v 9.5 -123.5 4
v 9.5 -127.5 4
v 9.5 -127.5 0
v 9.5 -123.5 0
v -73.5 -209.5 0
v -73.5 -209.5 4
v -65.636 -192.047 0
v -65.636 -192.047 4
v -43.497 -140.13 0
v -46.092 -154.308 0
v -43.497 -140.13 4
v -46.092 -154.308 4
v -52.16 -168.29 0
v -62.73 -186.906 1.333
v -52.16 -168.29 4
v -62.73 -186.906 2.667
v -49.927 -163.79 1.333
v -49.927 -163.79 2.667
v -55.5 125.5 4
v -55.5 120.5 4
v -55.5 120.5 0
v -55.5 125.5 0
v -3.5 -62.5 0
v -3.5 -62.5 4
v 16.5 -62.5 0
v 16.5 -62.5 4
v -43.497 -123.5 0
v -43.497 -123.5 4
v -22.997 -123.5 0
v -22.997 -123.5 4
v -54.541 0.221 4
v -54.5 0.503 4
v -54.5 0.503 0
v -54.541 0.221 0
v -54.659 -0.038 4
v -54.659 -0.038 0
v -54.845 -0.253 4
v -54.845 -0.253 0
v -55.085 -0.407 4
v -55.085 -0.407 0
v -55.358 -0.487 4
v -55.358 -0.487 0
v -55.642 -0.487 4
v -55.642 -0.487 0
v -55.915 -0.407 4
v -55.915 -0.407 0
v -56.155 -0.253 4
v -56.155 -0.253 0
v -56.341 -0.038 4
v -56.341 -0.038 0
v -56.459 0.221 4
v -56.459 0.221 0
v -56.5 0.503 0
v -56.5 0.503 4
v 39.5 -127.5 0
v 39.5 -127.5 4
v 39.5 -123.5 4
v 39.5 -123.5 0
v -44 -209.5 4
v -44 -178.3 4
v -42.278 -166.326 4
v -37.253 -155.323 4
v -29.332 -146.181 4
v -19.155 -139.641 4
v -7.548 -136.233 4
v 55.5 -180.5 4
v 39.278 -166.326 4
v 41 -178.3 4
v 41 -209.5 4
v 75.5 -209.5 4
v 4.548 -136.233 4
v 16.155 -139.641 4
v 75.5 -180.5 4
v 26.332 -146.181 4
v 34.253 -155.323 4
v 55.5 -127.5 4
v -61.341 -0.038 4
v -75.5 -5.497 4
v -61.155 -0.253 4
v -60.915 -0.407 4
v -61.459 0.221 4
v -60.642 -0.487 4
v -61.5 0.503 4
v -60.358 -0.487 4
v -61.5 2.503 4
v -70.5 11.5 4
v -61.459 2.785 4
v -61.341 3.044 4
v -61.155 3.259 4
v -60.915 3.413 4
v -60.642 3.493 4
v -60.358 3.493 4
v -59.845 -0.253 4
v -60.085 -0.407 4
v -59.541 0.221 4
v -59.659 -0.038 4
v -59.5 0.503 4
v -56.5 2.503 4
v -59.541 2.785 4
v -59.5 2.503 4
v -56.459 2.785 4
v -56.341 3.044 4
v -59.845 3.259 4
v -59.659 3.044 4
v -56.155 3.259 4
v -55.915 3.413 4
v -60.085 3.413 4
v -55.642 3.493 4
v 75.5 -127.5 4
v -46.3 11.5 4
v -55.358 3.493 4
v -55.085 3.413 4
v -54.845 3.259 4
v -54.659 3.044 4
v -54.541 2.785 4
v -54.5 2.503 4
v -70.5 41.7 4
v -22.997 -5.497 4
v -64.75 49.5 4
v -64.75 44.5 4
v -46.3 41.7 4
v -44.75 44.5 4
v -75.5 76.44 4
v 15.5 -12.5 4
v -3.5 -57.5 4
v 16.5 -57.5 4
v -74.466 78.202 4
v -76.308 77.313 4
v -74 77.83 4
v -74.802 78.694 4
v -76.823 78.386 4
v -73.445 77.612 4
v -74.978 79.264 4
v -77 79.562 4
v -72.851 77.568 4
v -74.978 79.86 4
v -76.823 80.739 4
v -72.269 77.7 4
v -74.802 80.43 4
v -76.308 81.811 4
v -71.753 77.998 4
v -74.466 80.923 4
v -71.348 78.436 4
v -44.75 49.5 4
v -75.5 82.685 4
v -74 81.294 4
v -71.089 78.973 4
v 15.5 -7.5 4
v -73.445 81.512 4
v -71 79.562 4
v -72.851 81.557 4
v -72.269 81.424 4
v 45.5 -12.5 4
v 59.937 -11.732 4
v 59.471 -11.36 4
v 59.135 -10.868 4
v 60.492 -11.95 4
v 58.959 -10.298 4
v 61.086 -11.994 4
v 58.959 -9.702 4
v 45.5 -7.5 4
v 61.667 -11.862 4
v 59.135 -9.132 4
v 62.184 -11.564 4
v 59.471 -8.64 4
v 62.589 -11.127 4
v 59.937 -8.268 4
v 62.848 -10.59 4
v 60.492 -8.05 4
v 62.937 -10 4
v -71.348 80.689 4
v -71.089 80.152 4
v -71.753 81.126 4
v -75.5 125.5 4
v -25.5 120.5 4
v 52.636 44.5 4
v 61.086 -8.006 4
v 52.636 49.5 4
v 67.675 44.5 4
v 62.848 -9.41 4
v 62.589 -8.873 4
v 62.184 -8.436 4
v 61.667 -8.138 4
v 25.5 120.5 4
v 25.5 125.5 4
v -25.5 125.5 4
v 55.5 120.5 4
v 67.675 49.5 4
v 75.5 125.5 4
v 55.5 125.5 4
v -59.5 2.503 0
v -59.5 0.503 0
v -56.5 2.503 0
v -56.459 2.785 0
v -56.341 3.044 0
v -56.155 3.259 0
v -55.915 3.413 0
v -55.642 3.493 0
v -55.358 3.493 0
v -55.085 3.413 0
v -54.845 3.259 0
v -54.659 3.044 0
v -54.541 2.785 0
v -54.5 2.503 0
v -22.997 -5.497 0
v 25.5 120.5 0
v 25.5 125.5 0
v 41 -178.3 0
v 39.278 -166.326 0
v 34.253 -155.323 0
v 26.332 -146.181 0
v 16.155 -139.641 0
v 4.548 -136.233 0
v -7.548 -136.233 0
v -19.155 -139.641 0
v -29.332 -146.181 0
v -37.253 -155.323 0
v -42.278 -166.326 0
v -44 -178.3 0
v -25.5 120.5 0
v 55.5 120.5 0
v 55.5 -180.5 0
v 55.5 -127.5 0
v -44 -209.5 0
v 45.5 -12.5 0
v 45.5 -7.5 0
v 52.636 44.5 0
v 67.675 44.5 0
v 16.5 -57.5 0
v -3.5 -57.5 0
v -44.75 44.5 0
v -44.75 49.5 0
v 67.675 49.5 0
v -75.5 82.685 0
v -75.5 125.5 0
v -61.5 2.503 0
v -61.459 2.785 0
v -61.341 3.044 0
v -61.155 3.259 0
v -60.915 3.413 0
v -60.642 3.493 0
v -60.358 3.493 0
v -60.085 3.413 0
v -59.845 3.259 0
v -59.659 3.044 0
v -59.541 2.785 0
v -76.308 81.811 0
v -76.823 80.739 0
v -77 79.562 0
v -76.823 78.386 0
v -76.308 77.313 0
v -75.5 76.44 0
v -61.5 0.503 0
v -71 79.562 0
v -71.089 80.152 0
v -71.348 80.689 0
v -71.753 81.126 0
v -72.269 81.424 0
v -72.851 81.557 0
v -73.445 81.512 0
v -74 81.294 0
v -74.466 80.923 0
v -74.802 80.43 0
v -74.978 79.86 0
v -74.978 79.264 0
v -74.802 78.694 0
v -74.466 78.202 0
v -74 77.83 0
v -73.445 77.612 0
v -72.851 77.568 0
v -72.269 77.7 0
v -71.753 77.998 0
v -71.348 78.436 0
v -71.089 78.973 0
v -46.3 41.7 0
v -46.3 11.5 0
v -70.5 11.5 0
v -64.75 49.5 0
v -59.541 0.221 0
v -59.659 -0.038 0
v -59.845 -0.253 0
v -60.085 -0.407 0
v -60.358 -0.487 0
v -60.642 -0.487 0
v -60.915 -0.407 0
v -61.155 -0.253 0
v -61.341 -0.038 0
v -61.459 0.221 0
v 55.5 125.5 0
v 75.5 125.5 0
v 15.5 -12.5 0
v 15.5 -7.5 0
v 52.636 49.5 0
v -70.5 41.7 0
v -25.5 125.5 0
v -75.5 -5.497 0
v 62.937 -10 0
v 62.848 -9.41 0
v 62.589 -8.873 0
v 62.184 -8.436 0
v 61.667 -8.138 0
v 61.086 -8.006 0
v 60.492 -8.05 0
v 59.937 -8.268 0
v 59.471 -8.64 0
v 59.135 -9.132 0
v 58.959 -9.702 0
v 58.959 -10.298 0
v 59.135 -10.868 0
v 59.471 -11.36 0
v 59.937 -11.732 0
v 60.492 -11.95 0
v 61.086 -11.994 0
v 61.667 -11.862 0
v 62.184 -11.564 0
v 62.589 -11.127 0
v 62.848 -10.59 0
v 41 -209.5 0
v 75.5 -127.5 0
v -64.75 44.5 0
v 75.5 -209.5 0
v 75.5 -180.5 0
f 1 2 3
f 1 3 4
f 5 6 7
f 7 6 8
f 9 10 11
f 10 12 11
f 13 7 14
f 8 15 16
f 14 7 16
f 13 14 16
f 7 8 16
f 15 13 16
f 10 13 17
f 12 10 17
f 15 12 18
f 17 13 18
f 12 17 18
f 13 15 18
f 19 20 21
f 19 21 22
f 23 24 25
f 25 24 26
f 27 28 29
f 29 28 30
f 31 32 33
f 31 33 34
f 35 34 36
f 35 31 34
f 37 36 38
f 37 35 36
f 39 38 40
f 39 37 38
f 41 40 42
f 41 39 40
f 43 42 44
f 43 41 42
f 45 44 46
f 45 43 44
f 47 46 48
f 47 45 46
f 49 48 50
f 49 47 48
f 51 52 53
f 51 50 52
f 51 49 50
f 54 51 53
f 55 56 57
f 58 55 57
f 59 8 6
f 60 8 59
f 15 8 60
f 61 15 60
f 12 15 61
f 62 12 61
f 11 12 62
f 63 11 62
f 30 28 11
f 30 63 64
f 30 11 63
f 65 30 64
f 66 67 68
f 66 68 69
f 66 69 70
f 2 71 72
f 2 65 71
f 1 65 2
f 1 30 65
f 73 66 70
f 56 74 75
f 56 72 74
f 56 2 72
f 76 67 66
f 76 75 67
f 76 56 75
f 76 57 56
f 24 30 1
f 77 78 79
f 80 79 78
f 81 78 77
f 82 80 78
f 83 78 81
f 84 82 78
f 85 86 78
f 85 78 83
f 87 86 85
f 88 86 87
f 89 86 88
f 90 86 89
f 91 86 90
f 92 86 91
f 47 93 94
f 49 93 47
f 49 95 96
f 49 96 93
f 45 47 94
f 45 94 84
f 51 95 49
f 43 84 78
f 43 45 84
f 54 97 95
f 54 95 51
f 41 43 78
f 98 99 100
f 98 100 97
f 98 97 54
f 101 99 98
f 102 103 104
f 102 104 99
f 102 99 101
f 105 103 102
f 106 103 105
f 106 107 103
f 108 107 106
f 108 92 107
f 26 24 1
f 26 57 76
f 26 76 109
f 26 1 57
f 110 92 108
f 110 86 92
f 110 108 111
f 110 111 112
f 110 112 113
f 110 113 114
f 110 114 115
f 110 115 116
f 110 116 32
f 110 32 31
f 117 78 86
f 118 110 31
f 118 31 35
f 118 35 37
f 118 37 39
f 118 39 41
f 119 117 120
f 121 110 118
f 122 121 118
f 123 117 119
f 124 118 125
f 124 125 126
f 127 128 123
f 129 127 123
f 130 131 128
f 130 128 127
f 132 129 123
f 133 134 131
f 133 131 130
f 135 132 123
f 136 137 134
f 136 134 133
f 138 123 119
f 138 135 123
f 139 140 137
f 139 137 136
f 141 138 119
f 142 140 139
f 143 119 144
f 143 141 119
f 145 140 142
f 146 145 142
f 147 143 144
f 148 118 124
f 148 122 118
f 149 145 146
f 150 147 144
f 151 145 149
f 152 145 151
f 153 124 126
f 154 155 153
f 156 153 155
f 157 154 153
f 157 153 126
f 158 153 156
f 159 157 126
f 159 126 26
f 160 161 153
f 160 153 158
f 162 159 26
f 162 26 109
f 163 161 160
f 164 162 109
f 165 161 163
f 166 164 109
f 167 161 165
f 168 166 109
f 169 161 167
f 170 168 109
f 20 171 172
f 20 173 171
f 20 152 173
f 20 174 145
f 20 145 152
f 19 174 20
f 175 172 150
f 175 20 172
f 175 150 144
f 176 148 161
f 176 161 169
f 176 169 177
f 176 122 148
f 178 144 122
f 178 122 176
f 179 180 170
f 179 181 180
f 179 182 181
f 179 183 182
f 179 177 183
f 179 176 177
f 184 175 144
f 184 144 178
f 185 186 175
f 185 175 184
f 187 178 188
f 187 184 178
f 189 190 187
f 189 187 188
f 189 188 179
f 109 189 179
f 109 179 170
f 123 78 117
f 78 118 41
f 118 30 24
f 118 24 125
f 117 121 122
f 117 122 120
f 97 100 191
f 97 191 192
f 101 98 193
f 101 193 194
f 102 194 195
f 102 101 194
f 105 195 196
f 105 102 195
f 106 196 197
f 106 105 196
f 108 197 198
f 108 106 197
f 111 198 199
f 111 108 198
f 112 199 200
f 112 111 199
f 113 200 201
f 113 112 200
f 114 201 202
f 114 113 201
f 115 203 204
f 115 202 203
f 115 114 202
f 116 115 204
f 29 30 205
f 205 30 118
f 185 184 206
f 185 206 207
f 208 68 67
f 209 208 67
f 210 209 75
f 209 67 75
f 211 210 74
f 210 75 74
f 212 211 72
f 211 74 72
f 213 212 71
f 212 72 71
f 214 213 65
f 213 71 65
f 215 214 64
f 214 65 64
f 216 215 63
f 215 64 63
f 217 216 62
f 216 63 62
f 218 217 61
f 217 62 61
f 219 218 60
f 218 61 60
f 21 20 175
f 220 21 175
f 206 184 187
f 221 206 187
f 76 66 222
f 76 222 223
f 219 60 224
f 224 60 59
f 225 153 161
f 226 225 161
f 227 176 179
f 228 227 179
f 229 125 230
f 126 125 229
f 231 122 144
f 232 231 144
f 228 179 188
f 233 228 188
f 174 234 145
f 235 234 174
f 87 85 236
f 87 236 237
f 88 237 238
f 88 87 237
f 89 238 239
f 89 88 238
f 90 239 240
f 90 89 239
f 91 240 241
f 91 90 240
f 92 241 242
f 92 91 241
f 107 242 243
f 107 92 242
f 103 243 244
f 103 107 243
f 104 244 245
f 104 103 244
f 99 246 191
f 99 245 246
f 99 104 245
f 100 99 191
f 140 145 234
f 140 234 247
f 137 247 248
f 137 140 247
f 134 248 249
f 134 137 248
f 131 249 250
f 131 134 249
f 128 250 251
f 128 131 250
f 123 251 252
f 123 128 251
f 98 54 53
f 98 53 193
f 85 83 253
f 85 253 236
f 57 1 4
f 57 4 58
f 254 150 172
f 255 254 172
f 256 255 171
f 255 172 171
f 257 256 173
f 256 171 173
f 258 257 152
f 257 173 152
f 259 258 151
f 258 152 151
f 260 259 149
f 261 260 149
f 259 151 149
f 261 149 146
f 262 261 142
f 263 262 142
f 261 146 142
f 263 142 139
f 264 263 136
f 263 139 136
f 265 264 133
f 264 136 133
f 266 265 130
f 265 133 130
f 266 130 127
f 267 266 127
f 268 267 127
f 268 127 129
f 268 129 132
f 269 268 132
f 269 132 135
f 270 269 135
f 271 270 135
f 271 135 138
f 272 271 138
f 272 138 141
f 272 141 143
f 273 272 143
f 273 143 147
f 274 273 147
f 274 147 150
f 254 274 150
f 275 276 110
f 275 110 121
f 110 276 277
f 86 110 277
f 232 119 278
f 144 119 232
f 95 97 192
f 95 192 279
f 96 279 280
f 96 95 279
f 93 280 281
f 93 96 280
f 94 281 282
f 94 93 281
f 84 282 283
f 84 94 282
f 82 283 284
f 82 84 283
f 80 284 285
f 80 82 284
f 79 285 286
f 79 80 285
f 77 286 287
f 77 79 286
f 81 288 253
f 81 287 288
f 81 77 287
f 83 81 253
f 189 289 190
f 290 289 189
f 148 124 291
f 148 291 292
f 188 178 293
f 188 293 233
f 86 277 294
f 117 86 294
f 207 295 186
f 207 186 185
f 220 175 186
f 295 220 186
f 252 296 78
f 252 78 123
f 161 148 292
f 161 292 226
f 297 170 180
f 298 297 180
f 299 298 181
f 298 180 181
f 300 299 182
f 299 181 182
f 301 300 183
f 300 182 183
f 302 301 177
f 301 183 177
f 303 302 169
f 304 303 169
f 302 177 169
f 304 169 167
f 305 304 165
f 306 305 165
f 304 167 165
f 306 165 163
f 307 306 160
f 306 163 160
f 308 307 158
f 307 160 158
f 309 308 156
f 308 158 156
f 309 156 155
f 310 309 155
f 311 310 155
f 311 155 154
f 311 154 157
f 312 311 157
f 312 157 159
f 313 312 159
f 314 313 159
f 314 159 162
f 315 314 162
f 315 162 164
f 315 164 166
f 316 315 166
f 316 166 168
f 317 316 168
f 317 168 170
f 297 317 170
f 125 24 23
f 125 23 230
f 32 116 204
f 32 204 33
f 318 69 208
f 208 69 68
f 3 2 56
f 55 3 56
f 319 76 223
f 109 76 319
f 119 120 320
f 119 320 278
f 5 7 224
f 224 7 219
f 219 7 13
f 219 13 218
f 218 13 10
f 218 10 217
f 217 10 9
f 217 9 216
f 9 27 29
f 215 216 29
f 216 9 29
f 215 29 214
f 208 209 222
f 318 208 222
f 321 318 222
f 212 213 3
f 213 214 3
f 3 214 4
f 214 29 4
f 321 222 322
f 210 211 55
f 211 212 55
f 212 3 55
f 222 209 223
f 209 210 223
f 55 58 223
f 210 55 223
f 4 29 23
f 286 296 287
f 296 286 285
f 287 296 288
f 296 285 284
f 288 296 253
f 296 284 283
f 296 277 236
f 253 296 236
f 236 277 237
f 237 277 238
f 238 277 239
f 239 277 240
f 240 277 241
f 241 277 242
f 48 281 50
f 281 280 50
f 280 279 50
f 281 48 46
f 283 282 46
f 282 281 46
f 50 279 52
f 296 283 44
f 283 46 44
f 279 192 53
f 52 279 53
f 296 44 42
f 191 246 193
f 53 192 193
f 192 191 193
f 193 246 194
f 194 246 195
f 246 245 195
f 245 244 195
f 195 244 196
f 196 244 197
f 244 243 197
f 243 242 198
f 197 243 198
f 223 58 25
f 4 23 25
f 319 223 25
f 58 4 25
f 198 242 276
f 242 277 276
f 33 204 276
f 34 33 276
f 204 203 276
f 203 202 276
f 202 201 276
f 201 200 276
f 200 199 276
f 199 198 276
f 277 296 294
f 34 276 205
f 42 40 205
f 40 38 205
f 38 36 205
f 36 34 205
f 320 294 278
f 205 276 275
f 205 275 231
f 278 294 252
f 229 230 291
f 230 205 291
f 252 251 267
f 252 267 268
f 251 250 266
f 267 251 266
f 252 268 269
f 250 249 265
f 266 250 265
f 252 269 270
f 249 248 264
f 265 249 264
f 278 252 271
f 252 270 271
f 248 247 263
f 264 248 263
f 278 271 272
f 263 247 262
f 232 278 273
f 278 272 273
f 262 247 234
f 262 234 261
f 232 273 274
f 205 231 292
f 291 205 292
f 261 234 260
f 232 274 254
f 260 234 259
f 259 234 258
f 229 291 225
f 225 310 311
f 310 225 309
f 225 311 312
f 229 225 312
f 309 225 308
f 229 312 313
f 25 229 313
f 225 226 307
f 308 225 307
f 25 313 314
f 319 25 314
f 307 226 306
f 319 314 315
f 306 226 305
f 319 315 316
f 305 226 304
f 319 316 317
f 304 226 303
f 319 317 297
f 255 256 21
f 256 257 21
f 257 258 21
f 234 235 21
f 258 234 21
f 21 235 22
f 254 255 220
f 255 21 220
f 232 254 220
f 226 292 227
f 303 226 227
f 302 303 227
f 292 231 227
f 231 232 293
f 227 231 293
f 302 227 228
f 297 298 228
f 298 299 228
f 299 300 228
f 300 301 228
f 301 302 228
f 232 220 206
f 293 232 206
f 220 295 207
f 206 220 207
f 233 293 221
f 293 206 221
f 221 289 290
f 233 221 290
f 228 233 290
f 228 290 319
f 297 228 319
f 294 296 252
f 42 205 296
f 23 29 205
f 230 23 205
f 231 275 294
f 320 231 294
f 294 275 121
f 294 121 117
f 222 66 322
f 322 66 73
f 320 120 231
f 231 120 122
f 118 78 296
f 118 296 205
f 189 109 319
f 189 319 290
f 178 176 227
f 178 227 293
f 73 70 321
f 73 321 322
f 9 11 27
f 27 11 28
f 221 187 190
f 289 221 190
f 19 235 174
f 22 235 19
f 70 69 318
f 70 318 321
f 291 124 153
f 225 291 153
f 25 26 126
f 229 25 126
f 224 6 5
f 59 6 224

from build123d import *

# Parameters (mm, degrees)
SKETCH1_W           = 151
SKETCH1_H           = 253
BOSS_EXTRUDE1_DEPTH = 4
SKETCH2_W           = 52.50306414
SKETCH2_H           = 122.00289527
CUT_EXTRUDE1_DEPTH  = 5
CUT_EXTRUDE4_DEPTH  = 5
SKETCH8_R           = 2
CUT_EXTRUDE6_DEPTH  = 5
SKETCH10_R          = 4
SKETCH10_R_2        = 2
BOSS_EXTRUDE3_DEPTH = 4
SKETCH11_W          = 24.2
SKETCH11_H          = 30.2
CUT_EXTRUDE9_DEPTH  = 10
SKETCH16_W          = 118.99693586
SKETCH16_H          = 82
BOSS_EXTRUDE4_DEPTH = 4
BOSS_EXTRUDE5_DEPTH = 4
CUT_EXTRUDE13_DEPTH = 10
SKETCH27_W          = 20
SKETCH27_H          = 53
CUT_EXTRUDE14_DEPTH = 5
SKETCH29_W          = 20.5
SKETCH29_H          = 4
BOSS_EXTRUDE6_DEPTH = 4
SKETCH31_W          = 30
SKETCH31_H          = 5
SKETCH31_W_2        = 15.03868673
SKETCH31_W_3        = 20
SKETCH31_H_2        = 4
CUT_EXTRUDE16_DEPTH = 10
SKETCH32_R          = 2
CUT_EXTRUDE17_DEPTH = 10


with BuildPart() as part:
    # Sketch1 → Boss-Extrude1 (new body)
    with BuildSketch(Plane.XY):
        with Locations((0, -1)):
            Rectangle(SKETCH1_W, SKETCH1_H)
    extrude(amount=BOSS_EXTRUDE1_DEPTH)

    # Sketch2 → Cut-Extrude1 (cut)
    with BuildSketch(Plane.XY.offset(4)):
        with Locations((-49.24846793, -66.498552365)):
            Rectangle(SKETCH2_W, SKETCH2_H)
    extrude(amount=-CUT_EXTRUDE1_DEPTH, mode=Mode.SUBTRACT)

    # Sketch5 → Cut-Extrude4 (cut)
    with BuildSketch(Plane.XY.offset(4)):
        with BuildLine():
            Line((-61.5, 0.50289527), (-61.5, 2.50289527))
            ThreePointArc((-61.5, 2.50289527), (-60.5, 3.50289527), (-59.5, 2.50289527))
            Line((-59.5, 2.50289527), (-59.5, 0.50289527))
            ThreePointArc((-59.5, 0.50289527), (-60.5, -0.49710473), (-61.5, 0.50289527))
        make_face()
        with BuildLine():
            Line((-56.5, 0.50289527), (-56.5, 2.50289527))
            ThreePointArc((-56.5, 2.50289527), (-55.5, 3.50289527), (-54.5, 2.50289527))
            Line((-54.5, 2.50289527), (-54.5, 0.50289527))
            ThreePointArc((-54.5, 0.50289527), (-55.5, -0.49710473), (-56.5, 0.50289527))
        make_face()
    extrude(amount=-CUT_EXTRUDE4_DEPTH, mode=Mode.SUBTRACT)

    # Sketch8 → Cut-Extrude6 (cut)
    with BuildSketch(Plane.XY.offset(4)):
        with Locations((-73, 79.562158061)):
            Circle(SKETCH8_R)
    extrude(amount=-CUT_EXTRUDE6_DEPTH, mode=Mode.SUBTRACT)

    # Sketch10 → Boss-Extrude3 (add)
    with BuildSketch(Plane.XY.offset(4)):
        with Locations((-73, 79.562158061)):
            Circle(SKETCH10_R)
        with Locations((-73, 79.562158061)):
            Circle(SKETCH10_R_2, mode=Mode.SUBTRACT)
    extrude(amount=-BOSS_EXTRUDE3_DEPTH)

    # Sketch11 → Cut-Extrude9 (cut)
    with BuildSketch(Plane(origin=(0, 0, 0), x_dir=(-1, 0, 0), z_dir=(0, 0, -1))):
        with Locations((58.4, 26.6)):
            Rectangle(SKETCH11_W, SKETCH11_H)
    extrude(amount=-CUT_EXTRUDE9_DEPTH, mode=Mode.SUBTRACT)

    # Sketch16 → Boss-Extrude4 (add)
    with BuildSketch(Plane.XY.offset(4)):
        with Locations((16.00153207, -168.5)):
            Rectangle(SKETCH16_W, SKETCH16_H)
    extrude(amount=-BOSS_EXTRUDE4_DEPTH)

    # Sketch24 → Boss-Extrude5 (add)
    with BuildSketch(Plane.XY.offset(4)):
        with BuildLine():
            Line((-43.49693586, -209.5), (-43.49693586, -140.130236158))
            add(Edge.make_bspline(
                [(-73.5, -209.5), (-66.548744275, -187.160783495), (-43.937613379, -164.067684131), (-43.49693586, -140.130236158)],
                knots=[0, 0, 0, 0, 0.851213122, 0.851213122, 0.851213122, 0.851213122], degree=3))
            Line((-73.5, -209.5), (-43.49693586, -209.5))
        make_face()
    extrude(amount=-BOSS_EXTRUDE5_DEPTH)

    # Sketch26 → Cut-Extrude13 (cut)
    with BuildSketch(Plane.XY.offset(4)):
        with BuildLine():
            Line((-44, -178.3), (-44, -209.5))
            Line((-44, -209.5), (41, -209.5))
            Line((41, -209.5), (41, -178.3))
            ThreePointArc((41, -178.3), (-1.5, -135.8), (-44, -178.3))
        make_face()
    extrude(amount=-CUT_EXTRUDE13_DEPTH, mode=Mode.SUBTRACT)

    # Sketch27 → Cut-Extrude14 (cut)
    with BuildSketch(Plane.XY.offset(4)):
        with Locations((65.5, -154)):
            Rectangle(SKETCH27_W, SKETCH27_H)
    extrude(amount=-CUT_EXTRUDE14_DEPTH, mode=Mode.SUBTRACT)

    # Sketch29 → Boss-Extrude6 (add)
    with BuildSketch(Plane.XY.offset(4)):
        with Locations((-33.24693586, -125.5)):
            Rectangle(SKETCH29_W, SKETCH29_H)
    extrude(amount=-BOSS_EXTRUDE6_DEPTH)

    # Sketch31 → Cut-Extrude16 (cut)
    with BuildSketch(Plane.XY.offset(4)):
        with Locations((40.5, 123)):
            Rectangle(SKETCH31_W, SKETCH31_H)
        with Locations((-40.5, 123)):
            Rectangle(SKETCH31_W, SKETCH31_H)
        with Locations((60.155656635, 47)):
            Rectangle(SKETCH31_W_2, SKETCH31_H)
        with Locations((30.5, -10)):
            Rectangle(SKETCH31_W, SKETCH31_H)
        with Locations((6.5, -60)):
            Rectangle(SKETCH31_W_3, SKETCH31_H)
        with Locations((-54.75, 47)):
            Rectangle(SKETCH31_W_3, SKETCH31_H)
        with Locations((24.5, -125.5)):
            Rectangle(SKETCH31_W, SKETCH31_H_2)
    extrude(amount=-CUT_EXTRUDE16_DEPTH, mode=Mode.SUBTRACT)

    # Sketch32 → Cut-Extrude17 (cut)
    with BuildSketch(Plane.XY.offset(4)):
        with Locations((60.936739195, -10)):
            Circle(SKETCH32_R)
    extrude(amount=-CUT_EXTRUDE17_DEPTH, mode=Mode.SUBTRACT)


solid = part.part
